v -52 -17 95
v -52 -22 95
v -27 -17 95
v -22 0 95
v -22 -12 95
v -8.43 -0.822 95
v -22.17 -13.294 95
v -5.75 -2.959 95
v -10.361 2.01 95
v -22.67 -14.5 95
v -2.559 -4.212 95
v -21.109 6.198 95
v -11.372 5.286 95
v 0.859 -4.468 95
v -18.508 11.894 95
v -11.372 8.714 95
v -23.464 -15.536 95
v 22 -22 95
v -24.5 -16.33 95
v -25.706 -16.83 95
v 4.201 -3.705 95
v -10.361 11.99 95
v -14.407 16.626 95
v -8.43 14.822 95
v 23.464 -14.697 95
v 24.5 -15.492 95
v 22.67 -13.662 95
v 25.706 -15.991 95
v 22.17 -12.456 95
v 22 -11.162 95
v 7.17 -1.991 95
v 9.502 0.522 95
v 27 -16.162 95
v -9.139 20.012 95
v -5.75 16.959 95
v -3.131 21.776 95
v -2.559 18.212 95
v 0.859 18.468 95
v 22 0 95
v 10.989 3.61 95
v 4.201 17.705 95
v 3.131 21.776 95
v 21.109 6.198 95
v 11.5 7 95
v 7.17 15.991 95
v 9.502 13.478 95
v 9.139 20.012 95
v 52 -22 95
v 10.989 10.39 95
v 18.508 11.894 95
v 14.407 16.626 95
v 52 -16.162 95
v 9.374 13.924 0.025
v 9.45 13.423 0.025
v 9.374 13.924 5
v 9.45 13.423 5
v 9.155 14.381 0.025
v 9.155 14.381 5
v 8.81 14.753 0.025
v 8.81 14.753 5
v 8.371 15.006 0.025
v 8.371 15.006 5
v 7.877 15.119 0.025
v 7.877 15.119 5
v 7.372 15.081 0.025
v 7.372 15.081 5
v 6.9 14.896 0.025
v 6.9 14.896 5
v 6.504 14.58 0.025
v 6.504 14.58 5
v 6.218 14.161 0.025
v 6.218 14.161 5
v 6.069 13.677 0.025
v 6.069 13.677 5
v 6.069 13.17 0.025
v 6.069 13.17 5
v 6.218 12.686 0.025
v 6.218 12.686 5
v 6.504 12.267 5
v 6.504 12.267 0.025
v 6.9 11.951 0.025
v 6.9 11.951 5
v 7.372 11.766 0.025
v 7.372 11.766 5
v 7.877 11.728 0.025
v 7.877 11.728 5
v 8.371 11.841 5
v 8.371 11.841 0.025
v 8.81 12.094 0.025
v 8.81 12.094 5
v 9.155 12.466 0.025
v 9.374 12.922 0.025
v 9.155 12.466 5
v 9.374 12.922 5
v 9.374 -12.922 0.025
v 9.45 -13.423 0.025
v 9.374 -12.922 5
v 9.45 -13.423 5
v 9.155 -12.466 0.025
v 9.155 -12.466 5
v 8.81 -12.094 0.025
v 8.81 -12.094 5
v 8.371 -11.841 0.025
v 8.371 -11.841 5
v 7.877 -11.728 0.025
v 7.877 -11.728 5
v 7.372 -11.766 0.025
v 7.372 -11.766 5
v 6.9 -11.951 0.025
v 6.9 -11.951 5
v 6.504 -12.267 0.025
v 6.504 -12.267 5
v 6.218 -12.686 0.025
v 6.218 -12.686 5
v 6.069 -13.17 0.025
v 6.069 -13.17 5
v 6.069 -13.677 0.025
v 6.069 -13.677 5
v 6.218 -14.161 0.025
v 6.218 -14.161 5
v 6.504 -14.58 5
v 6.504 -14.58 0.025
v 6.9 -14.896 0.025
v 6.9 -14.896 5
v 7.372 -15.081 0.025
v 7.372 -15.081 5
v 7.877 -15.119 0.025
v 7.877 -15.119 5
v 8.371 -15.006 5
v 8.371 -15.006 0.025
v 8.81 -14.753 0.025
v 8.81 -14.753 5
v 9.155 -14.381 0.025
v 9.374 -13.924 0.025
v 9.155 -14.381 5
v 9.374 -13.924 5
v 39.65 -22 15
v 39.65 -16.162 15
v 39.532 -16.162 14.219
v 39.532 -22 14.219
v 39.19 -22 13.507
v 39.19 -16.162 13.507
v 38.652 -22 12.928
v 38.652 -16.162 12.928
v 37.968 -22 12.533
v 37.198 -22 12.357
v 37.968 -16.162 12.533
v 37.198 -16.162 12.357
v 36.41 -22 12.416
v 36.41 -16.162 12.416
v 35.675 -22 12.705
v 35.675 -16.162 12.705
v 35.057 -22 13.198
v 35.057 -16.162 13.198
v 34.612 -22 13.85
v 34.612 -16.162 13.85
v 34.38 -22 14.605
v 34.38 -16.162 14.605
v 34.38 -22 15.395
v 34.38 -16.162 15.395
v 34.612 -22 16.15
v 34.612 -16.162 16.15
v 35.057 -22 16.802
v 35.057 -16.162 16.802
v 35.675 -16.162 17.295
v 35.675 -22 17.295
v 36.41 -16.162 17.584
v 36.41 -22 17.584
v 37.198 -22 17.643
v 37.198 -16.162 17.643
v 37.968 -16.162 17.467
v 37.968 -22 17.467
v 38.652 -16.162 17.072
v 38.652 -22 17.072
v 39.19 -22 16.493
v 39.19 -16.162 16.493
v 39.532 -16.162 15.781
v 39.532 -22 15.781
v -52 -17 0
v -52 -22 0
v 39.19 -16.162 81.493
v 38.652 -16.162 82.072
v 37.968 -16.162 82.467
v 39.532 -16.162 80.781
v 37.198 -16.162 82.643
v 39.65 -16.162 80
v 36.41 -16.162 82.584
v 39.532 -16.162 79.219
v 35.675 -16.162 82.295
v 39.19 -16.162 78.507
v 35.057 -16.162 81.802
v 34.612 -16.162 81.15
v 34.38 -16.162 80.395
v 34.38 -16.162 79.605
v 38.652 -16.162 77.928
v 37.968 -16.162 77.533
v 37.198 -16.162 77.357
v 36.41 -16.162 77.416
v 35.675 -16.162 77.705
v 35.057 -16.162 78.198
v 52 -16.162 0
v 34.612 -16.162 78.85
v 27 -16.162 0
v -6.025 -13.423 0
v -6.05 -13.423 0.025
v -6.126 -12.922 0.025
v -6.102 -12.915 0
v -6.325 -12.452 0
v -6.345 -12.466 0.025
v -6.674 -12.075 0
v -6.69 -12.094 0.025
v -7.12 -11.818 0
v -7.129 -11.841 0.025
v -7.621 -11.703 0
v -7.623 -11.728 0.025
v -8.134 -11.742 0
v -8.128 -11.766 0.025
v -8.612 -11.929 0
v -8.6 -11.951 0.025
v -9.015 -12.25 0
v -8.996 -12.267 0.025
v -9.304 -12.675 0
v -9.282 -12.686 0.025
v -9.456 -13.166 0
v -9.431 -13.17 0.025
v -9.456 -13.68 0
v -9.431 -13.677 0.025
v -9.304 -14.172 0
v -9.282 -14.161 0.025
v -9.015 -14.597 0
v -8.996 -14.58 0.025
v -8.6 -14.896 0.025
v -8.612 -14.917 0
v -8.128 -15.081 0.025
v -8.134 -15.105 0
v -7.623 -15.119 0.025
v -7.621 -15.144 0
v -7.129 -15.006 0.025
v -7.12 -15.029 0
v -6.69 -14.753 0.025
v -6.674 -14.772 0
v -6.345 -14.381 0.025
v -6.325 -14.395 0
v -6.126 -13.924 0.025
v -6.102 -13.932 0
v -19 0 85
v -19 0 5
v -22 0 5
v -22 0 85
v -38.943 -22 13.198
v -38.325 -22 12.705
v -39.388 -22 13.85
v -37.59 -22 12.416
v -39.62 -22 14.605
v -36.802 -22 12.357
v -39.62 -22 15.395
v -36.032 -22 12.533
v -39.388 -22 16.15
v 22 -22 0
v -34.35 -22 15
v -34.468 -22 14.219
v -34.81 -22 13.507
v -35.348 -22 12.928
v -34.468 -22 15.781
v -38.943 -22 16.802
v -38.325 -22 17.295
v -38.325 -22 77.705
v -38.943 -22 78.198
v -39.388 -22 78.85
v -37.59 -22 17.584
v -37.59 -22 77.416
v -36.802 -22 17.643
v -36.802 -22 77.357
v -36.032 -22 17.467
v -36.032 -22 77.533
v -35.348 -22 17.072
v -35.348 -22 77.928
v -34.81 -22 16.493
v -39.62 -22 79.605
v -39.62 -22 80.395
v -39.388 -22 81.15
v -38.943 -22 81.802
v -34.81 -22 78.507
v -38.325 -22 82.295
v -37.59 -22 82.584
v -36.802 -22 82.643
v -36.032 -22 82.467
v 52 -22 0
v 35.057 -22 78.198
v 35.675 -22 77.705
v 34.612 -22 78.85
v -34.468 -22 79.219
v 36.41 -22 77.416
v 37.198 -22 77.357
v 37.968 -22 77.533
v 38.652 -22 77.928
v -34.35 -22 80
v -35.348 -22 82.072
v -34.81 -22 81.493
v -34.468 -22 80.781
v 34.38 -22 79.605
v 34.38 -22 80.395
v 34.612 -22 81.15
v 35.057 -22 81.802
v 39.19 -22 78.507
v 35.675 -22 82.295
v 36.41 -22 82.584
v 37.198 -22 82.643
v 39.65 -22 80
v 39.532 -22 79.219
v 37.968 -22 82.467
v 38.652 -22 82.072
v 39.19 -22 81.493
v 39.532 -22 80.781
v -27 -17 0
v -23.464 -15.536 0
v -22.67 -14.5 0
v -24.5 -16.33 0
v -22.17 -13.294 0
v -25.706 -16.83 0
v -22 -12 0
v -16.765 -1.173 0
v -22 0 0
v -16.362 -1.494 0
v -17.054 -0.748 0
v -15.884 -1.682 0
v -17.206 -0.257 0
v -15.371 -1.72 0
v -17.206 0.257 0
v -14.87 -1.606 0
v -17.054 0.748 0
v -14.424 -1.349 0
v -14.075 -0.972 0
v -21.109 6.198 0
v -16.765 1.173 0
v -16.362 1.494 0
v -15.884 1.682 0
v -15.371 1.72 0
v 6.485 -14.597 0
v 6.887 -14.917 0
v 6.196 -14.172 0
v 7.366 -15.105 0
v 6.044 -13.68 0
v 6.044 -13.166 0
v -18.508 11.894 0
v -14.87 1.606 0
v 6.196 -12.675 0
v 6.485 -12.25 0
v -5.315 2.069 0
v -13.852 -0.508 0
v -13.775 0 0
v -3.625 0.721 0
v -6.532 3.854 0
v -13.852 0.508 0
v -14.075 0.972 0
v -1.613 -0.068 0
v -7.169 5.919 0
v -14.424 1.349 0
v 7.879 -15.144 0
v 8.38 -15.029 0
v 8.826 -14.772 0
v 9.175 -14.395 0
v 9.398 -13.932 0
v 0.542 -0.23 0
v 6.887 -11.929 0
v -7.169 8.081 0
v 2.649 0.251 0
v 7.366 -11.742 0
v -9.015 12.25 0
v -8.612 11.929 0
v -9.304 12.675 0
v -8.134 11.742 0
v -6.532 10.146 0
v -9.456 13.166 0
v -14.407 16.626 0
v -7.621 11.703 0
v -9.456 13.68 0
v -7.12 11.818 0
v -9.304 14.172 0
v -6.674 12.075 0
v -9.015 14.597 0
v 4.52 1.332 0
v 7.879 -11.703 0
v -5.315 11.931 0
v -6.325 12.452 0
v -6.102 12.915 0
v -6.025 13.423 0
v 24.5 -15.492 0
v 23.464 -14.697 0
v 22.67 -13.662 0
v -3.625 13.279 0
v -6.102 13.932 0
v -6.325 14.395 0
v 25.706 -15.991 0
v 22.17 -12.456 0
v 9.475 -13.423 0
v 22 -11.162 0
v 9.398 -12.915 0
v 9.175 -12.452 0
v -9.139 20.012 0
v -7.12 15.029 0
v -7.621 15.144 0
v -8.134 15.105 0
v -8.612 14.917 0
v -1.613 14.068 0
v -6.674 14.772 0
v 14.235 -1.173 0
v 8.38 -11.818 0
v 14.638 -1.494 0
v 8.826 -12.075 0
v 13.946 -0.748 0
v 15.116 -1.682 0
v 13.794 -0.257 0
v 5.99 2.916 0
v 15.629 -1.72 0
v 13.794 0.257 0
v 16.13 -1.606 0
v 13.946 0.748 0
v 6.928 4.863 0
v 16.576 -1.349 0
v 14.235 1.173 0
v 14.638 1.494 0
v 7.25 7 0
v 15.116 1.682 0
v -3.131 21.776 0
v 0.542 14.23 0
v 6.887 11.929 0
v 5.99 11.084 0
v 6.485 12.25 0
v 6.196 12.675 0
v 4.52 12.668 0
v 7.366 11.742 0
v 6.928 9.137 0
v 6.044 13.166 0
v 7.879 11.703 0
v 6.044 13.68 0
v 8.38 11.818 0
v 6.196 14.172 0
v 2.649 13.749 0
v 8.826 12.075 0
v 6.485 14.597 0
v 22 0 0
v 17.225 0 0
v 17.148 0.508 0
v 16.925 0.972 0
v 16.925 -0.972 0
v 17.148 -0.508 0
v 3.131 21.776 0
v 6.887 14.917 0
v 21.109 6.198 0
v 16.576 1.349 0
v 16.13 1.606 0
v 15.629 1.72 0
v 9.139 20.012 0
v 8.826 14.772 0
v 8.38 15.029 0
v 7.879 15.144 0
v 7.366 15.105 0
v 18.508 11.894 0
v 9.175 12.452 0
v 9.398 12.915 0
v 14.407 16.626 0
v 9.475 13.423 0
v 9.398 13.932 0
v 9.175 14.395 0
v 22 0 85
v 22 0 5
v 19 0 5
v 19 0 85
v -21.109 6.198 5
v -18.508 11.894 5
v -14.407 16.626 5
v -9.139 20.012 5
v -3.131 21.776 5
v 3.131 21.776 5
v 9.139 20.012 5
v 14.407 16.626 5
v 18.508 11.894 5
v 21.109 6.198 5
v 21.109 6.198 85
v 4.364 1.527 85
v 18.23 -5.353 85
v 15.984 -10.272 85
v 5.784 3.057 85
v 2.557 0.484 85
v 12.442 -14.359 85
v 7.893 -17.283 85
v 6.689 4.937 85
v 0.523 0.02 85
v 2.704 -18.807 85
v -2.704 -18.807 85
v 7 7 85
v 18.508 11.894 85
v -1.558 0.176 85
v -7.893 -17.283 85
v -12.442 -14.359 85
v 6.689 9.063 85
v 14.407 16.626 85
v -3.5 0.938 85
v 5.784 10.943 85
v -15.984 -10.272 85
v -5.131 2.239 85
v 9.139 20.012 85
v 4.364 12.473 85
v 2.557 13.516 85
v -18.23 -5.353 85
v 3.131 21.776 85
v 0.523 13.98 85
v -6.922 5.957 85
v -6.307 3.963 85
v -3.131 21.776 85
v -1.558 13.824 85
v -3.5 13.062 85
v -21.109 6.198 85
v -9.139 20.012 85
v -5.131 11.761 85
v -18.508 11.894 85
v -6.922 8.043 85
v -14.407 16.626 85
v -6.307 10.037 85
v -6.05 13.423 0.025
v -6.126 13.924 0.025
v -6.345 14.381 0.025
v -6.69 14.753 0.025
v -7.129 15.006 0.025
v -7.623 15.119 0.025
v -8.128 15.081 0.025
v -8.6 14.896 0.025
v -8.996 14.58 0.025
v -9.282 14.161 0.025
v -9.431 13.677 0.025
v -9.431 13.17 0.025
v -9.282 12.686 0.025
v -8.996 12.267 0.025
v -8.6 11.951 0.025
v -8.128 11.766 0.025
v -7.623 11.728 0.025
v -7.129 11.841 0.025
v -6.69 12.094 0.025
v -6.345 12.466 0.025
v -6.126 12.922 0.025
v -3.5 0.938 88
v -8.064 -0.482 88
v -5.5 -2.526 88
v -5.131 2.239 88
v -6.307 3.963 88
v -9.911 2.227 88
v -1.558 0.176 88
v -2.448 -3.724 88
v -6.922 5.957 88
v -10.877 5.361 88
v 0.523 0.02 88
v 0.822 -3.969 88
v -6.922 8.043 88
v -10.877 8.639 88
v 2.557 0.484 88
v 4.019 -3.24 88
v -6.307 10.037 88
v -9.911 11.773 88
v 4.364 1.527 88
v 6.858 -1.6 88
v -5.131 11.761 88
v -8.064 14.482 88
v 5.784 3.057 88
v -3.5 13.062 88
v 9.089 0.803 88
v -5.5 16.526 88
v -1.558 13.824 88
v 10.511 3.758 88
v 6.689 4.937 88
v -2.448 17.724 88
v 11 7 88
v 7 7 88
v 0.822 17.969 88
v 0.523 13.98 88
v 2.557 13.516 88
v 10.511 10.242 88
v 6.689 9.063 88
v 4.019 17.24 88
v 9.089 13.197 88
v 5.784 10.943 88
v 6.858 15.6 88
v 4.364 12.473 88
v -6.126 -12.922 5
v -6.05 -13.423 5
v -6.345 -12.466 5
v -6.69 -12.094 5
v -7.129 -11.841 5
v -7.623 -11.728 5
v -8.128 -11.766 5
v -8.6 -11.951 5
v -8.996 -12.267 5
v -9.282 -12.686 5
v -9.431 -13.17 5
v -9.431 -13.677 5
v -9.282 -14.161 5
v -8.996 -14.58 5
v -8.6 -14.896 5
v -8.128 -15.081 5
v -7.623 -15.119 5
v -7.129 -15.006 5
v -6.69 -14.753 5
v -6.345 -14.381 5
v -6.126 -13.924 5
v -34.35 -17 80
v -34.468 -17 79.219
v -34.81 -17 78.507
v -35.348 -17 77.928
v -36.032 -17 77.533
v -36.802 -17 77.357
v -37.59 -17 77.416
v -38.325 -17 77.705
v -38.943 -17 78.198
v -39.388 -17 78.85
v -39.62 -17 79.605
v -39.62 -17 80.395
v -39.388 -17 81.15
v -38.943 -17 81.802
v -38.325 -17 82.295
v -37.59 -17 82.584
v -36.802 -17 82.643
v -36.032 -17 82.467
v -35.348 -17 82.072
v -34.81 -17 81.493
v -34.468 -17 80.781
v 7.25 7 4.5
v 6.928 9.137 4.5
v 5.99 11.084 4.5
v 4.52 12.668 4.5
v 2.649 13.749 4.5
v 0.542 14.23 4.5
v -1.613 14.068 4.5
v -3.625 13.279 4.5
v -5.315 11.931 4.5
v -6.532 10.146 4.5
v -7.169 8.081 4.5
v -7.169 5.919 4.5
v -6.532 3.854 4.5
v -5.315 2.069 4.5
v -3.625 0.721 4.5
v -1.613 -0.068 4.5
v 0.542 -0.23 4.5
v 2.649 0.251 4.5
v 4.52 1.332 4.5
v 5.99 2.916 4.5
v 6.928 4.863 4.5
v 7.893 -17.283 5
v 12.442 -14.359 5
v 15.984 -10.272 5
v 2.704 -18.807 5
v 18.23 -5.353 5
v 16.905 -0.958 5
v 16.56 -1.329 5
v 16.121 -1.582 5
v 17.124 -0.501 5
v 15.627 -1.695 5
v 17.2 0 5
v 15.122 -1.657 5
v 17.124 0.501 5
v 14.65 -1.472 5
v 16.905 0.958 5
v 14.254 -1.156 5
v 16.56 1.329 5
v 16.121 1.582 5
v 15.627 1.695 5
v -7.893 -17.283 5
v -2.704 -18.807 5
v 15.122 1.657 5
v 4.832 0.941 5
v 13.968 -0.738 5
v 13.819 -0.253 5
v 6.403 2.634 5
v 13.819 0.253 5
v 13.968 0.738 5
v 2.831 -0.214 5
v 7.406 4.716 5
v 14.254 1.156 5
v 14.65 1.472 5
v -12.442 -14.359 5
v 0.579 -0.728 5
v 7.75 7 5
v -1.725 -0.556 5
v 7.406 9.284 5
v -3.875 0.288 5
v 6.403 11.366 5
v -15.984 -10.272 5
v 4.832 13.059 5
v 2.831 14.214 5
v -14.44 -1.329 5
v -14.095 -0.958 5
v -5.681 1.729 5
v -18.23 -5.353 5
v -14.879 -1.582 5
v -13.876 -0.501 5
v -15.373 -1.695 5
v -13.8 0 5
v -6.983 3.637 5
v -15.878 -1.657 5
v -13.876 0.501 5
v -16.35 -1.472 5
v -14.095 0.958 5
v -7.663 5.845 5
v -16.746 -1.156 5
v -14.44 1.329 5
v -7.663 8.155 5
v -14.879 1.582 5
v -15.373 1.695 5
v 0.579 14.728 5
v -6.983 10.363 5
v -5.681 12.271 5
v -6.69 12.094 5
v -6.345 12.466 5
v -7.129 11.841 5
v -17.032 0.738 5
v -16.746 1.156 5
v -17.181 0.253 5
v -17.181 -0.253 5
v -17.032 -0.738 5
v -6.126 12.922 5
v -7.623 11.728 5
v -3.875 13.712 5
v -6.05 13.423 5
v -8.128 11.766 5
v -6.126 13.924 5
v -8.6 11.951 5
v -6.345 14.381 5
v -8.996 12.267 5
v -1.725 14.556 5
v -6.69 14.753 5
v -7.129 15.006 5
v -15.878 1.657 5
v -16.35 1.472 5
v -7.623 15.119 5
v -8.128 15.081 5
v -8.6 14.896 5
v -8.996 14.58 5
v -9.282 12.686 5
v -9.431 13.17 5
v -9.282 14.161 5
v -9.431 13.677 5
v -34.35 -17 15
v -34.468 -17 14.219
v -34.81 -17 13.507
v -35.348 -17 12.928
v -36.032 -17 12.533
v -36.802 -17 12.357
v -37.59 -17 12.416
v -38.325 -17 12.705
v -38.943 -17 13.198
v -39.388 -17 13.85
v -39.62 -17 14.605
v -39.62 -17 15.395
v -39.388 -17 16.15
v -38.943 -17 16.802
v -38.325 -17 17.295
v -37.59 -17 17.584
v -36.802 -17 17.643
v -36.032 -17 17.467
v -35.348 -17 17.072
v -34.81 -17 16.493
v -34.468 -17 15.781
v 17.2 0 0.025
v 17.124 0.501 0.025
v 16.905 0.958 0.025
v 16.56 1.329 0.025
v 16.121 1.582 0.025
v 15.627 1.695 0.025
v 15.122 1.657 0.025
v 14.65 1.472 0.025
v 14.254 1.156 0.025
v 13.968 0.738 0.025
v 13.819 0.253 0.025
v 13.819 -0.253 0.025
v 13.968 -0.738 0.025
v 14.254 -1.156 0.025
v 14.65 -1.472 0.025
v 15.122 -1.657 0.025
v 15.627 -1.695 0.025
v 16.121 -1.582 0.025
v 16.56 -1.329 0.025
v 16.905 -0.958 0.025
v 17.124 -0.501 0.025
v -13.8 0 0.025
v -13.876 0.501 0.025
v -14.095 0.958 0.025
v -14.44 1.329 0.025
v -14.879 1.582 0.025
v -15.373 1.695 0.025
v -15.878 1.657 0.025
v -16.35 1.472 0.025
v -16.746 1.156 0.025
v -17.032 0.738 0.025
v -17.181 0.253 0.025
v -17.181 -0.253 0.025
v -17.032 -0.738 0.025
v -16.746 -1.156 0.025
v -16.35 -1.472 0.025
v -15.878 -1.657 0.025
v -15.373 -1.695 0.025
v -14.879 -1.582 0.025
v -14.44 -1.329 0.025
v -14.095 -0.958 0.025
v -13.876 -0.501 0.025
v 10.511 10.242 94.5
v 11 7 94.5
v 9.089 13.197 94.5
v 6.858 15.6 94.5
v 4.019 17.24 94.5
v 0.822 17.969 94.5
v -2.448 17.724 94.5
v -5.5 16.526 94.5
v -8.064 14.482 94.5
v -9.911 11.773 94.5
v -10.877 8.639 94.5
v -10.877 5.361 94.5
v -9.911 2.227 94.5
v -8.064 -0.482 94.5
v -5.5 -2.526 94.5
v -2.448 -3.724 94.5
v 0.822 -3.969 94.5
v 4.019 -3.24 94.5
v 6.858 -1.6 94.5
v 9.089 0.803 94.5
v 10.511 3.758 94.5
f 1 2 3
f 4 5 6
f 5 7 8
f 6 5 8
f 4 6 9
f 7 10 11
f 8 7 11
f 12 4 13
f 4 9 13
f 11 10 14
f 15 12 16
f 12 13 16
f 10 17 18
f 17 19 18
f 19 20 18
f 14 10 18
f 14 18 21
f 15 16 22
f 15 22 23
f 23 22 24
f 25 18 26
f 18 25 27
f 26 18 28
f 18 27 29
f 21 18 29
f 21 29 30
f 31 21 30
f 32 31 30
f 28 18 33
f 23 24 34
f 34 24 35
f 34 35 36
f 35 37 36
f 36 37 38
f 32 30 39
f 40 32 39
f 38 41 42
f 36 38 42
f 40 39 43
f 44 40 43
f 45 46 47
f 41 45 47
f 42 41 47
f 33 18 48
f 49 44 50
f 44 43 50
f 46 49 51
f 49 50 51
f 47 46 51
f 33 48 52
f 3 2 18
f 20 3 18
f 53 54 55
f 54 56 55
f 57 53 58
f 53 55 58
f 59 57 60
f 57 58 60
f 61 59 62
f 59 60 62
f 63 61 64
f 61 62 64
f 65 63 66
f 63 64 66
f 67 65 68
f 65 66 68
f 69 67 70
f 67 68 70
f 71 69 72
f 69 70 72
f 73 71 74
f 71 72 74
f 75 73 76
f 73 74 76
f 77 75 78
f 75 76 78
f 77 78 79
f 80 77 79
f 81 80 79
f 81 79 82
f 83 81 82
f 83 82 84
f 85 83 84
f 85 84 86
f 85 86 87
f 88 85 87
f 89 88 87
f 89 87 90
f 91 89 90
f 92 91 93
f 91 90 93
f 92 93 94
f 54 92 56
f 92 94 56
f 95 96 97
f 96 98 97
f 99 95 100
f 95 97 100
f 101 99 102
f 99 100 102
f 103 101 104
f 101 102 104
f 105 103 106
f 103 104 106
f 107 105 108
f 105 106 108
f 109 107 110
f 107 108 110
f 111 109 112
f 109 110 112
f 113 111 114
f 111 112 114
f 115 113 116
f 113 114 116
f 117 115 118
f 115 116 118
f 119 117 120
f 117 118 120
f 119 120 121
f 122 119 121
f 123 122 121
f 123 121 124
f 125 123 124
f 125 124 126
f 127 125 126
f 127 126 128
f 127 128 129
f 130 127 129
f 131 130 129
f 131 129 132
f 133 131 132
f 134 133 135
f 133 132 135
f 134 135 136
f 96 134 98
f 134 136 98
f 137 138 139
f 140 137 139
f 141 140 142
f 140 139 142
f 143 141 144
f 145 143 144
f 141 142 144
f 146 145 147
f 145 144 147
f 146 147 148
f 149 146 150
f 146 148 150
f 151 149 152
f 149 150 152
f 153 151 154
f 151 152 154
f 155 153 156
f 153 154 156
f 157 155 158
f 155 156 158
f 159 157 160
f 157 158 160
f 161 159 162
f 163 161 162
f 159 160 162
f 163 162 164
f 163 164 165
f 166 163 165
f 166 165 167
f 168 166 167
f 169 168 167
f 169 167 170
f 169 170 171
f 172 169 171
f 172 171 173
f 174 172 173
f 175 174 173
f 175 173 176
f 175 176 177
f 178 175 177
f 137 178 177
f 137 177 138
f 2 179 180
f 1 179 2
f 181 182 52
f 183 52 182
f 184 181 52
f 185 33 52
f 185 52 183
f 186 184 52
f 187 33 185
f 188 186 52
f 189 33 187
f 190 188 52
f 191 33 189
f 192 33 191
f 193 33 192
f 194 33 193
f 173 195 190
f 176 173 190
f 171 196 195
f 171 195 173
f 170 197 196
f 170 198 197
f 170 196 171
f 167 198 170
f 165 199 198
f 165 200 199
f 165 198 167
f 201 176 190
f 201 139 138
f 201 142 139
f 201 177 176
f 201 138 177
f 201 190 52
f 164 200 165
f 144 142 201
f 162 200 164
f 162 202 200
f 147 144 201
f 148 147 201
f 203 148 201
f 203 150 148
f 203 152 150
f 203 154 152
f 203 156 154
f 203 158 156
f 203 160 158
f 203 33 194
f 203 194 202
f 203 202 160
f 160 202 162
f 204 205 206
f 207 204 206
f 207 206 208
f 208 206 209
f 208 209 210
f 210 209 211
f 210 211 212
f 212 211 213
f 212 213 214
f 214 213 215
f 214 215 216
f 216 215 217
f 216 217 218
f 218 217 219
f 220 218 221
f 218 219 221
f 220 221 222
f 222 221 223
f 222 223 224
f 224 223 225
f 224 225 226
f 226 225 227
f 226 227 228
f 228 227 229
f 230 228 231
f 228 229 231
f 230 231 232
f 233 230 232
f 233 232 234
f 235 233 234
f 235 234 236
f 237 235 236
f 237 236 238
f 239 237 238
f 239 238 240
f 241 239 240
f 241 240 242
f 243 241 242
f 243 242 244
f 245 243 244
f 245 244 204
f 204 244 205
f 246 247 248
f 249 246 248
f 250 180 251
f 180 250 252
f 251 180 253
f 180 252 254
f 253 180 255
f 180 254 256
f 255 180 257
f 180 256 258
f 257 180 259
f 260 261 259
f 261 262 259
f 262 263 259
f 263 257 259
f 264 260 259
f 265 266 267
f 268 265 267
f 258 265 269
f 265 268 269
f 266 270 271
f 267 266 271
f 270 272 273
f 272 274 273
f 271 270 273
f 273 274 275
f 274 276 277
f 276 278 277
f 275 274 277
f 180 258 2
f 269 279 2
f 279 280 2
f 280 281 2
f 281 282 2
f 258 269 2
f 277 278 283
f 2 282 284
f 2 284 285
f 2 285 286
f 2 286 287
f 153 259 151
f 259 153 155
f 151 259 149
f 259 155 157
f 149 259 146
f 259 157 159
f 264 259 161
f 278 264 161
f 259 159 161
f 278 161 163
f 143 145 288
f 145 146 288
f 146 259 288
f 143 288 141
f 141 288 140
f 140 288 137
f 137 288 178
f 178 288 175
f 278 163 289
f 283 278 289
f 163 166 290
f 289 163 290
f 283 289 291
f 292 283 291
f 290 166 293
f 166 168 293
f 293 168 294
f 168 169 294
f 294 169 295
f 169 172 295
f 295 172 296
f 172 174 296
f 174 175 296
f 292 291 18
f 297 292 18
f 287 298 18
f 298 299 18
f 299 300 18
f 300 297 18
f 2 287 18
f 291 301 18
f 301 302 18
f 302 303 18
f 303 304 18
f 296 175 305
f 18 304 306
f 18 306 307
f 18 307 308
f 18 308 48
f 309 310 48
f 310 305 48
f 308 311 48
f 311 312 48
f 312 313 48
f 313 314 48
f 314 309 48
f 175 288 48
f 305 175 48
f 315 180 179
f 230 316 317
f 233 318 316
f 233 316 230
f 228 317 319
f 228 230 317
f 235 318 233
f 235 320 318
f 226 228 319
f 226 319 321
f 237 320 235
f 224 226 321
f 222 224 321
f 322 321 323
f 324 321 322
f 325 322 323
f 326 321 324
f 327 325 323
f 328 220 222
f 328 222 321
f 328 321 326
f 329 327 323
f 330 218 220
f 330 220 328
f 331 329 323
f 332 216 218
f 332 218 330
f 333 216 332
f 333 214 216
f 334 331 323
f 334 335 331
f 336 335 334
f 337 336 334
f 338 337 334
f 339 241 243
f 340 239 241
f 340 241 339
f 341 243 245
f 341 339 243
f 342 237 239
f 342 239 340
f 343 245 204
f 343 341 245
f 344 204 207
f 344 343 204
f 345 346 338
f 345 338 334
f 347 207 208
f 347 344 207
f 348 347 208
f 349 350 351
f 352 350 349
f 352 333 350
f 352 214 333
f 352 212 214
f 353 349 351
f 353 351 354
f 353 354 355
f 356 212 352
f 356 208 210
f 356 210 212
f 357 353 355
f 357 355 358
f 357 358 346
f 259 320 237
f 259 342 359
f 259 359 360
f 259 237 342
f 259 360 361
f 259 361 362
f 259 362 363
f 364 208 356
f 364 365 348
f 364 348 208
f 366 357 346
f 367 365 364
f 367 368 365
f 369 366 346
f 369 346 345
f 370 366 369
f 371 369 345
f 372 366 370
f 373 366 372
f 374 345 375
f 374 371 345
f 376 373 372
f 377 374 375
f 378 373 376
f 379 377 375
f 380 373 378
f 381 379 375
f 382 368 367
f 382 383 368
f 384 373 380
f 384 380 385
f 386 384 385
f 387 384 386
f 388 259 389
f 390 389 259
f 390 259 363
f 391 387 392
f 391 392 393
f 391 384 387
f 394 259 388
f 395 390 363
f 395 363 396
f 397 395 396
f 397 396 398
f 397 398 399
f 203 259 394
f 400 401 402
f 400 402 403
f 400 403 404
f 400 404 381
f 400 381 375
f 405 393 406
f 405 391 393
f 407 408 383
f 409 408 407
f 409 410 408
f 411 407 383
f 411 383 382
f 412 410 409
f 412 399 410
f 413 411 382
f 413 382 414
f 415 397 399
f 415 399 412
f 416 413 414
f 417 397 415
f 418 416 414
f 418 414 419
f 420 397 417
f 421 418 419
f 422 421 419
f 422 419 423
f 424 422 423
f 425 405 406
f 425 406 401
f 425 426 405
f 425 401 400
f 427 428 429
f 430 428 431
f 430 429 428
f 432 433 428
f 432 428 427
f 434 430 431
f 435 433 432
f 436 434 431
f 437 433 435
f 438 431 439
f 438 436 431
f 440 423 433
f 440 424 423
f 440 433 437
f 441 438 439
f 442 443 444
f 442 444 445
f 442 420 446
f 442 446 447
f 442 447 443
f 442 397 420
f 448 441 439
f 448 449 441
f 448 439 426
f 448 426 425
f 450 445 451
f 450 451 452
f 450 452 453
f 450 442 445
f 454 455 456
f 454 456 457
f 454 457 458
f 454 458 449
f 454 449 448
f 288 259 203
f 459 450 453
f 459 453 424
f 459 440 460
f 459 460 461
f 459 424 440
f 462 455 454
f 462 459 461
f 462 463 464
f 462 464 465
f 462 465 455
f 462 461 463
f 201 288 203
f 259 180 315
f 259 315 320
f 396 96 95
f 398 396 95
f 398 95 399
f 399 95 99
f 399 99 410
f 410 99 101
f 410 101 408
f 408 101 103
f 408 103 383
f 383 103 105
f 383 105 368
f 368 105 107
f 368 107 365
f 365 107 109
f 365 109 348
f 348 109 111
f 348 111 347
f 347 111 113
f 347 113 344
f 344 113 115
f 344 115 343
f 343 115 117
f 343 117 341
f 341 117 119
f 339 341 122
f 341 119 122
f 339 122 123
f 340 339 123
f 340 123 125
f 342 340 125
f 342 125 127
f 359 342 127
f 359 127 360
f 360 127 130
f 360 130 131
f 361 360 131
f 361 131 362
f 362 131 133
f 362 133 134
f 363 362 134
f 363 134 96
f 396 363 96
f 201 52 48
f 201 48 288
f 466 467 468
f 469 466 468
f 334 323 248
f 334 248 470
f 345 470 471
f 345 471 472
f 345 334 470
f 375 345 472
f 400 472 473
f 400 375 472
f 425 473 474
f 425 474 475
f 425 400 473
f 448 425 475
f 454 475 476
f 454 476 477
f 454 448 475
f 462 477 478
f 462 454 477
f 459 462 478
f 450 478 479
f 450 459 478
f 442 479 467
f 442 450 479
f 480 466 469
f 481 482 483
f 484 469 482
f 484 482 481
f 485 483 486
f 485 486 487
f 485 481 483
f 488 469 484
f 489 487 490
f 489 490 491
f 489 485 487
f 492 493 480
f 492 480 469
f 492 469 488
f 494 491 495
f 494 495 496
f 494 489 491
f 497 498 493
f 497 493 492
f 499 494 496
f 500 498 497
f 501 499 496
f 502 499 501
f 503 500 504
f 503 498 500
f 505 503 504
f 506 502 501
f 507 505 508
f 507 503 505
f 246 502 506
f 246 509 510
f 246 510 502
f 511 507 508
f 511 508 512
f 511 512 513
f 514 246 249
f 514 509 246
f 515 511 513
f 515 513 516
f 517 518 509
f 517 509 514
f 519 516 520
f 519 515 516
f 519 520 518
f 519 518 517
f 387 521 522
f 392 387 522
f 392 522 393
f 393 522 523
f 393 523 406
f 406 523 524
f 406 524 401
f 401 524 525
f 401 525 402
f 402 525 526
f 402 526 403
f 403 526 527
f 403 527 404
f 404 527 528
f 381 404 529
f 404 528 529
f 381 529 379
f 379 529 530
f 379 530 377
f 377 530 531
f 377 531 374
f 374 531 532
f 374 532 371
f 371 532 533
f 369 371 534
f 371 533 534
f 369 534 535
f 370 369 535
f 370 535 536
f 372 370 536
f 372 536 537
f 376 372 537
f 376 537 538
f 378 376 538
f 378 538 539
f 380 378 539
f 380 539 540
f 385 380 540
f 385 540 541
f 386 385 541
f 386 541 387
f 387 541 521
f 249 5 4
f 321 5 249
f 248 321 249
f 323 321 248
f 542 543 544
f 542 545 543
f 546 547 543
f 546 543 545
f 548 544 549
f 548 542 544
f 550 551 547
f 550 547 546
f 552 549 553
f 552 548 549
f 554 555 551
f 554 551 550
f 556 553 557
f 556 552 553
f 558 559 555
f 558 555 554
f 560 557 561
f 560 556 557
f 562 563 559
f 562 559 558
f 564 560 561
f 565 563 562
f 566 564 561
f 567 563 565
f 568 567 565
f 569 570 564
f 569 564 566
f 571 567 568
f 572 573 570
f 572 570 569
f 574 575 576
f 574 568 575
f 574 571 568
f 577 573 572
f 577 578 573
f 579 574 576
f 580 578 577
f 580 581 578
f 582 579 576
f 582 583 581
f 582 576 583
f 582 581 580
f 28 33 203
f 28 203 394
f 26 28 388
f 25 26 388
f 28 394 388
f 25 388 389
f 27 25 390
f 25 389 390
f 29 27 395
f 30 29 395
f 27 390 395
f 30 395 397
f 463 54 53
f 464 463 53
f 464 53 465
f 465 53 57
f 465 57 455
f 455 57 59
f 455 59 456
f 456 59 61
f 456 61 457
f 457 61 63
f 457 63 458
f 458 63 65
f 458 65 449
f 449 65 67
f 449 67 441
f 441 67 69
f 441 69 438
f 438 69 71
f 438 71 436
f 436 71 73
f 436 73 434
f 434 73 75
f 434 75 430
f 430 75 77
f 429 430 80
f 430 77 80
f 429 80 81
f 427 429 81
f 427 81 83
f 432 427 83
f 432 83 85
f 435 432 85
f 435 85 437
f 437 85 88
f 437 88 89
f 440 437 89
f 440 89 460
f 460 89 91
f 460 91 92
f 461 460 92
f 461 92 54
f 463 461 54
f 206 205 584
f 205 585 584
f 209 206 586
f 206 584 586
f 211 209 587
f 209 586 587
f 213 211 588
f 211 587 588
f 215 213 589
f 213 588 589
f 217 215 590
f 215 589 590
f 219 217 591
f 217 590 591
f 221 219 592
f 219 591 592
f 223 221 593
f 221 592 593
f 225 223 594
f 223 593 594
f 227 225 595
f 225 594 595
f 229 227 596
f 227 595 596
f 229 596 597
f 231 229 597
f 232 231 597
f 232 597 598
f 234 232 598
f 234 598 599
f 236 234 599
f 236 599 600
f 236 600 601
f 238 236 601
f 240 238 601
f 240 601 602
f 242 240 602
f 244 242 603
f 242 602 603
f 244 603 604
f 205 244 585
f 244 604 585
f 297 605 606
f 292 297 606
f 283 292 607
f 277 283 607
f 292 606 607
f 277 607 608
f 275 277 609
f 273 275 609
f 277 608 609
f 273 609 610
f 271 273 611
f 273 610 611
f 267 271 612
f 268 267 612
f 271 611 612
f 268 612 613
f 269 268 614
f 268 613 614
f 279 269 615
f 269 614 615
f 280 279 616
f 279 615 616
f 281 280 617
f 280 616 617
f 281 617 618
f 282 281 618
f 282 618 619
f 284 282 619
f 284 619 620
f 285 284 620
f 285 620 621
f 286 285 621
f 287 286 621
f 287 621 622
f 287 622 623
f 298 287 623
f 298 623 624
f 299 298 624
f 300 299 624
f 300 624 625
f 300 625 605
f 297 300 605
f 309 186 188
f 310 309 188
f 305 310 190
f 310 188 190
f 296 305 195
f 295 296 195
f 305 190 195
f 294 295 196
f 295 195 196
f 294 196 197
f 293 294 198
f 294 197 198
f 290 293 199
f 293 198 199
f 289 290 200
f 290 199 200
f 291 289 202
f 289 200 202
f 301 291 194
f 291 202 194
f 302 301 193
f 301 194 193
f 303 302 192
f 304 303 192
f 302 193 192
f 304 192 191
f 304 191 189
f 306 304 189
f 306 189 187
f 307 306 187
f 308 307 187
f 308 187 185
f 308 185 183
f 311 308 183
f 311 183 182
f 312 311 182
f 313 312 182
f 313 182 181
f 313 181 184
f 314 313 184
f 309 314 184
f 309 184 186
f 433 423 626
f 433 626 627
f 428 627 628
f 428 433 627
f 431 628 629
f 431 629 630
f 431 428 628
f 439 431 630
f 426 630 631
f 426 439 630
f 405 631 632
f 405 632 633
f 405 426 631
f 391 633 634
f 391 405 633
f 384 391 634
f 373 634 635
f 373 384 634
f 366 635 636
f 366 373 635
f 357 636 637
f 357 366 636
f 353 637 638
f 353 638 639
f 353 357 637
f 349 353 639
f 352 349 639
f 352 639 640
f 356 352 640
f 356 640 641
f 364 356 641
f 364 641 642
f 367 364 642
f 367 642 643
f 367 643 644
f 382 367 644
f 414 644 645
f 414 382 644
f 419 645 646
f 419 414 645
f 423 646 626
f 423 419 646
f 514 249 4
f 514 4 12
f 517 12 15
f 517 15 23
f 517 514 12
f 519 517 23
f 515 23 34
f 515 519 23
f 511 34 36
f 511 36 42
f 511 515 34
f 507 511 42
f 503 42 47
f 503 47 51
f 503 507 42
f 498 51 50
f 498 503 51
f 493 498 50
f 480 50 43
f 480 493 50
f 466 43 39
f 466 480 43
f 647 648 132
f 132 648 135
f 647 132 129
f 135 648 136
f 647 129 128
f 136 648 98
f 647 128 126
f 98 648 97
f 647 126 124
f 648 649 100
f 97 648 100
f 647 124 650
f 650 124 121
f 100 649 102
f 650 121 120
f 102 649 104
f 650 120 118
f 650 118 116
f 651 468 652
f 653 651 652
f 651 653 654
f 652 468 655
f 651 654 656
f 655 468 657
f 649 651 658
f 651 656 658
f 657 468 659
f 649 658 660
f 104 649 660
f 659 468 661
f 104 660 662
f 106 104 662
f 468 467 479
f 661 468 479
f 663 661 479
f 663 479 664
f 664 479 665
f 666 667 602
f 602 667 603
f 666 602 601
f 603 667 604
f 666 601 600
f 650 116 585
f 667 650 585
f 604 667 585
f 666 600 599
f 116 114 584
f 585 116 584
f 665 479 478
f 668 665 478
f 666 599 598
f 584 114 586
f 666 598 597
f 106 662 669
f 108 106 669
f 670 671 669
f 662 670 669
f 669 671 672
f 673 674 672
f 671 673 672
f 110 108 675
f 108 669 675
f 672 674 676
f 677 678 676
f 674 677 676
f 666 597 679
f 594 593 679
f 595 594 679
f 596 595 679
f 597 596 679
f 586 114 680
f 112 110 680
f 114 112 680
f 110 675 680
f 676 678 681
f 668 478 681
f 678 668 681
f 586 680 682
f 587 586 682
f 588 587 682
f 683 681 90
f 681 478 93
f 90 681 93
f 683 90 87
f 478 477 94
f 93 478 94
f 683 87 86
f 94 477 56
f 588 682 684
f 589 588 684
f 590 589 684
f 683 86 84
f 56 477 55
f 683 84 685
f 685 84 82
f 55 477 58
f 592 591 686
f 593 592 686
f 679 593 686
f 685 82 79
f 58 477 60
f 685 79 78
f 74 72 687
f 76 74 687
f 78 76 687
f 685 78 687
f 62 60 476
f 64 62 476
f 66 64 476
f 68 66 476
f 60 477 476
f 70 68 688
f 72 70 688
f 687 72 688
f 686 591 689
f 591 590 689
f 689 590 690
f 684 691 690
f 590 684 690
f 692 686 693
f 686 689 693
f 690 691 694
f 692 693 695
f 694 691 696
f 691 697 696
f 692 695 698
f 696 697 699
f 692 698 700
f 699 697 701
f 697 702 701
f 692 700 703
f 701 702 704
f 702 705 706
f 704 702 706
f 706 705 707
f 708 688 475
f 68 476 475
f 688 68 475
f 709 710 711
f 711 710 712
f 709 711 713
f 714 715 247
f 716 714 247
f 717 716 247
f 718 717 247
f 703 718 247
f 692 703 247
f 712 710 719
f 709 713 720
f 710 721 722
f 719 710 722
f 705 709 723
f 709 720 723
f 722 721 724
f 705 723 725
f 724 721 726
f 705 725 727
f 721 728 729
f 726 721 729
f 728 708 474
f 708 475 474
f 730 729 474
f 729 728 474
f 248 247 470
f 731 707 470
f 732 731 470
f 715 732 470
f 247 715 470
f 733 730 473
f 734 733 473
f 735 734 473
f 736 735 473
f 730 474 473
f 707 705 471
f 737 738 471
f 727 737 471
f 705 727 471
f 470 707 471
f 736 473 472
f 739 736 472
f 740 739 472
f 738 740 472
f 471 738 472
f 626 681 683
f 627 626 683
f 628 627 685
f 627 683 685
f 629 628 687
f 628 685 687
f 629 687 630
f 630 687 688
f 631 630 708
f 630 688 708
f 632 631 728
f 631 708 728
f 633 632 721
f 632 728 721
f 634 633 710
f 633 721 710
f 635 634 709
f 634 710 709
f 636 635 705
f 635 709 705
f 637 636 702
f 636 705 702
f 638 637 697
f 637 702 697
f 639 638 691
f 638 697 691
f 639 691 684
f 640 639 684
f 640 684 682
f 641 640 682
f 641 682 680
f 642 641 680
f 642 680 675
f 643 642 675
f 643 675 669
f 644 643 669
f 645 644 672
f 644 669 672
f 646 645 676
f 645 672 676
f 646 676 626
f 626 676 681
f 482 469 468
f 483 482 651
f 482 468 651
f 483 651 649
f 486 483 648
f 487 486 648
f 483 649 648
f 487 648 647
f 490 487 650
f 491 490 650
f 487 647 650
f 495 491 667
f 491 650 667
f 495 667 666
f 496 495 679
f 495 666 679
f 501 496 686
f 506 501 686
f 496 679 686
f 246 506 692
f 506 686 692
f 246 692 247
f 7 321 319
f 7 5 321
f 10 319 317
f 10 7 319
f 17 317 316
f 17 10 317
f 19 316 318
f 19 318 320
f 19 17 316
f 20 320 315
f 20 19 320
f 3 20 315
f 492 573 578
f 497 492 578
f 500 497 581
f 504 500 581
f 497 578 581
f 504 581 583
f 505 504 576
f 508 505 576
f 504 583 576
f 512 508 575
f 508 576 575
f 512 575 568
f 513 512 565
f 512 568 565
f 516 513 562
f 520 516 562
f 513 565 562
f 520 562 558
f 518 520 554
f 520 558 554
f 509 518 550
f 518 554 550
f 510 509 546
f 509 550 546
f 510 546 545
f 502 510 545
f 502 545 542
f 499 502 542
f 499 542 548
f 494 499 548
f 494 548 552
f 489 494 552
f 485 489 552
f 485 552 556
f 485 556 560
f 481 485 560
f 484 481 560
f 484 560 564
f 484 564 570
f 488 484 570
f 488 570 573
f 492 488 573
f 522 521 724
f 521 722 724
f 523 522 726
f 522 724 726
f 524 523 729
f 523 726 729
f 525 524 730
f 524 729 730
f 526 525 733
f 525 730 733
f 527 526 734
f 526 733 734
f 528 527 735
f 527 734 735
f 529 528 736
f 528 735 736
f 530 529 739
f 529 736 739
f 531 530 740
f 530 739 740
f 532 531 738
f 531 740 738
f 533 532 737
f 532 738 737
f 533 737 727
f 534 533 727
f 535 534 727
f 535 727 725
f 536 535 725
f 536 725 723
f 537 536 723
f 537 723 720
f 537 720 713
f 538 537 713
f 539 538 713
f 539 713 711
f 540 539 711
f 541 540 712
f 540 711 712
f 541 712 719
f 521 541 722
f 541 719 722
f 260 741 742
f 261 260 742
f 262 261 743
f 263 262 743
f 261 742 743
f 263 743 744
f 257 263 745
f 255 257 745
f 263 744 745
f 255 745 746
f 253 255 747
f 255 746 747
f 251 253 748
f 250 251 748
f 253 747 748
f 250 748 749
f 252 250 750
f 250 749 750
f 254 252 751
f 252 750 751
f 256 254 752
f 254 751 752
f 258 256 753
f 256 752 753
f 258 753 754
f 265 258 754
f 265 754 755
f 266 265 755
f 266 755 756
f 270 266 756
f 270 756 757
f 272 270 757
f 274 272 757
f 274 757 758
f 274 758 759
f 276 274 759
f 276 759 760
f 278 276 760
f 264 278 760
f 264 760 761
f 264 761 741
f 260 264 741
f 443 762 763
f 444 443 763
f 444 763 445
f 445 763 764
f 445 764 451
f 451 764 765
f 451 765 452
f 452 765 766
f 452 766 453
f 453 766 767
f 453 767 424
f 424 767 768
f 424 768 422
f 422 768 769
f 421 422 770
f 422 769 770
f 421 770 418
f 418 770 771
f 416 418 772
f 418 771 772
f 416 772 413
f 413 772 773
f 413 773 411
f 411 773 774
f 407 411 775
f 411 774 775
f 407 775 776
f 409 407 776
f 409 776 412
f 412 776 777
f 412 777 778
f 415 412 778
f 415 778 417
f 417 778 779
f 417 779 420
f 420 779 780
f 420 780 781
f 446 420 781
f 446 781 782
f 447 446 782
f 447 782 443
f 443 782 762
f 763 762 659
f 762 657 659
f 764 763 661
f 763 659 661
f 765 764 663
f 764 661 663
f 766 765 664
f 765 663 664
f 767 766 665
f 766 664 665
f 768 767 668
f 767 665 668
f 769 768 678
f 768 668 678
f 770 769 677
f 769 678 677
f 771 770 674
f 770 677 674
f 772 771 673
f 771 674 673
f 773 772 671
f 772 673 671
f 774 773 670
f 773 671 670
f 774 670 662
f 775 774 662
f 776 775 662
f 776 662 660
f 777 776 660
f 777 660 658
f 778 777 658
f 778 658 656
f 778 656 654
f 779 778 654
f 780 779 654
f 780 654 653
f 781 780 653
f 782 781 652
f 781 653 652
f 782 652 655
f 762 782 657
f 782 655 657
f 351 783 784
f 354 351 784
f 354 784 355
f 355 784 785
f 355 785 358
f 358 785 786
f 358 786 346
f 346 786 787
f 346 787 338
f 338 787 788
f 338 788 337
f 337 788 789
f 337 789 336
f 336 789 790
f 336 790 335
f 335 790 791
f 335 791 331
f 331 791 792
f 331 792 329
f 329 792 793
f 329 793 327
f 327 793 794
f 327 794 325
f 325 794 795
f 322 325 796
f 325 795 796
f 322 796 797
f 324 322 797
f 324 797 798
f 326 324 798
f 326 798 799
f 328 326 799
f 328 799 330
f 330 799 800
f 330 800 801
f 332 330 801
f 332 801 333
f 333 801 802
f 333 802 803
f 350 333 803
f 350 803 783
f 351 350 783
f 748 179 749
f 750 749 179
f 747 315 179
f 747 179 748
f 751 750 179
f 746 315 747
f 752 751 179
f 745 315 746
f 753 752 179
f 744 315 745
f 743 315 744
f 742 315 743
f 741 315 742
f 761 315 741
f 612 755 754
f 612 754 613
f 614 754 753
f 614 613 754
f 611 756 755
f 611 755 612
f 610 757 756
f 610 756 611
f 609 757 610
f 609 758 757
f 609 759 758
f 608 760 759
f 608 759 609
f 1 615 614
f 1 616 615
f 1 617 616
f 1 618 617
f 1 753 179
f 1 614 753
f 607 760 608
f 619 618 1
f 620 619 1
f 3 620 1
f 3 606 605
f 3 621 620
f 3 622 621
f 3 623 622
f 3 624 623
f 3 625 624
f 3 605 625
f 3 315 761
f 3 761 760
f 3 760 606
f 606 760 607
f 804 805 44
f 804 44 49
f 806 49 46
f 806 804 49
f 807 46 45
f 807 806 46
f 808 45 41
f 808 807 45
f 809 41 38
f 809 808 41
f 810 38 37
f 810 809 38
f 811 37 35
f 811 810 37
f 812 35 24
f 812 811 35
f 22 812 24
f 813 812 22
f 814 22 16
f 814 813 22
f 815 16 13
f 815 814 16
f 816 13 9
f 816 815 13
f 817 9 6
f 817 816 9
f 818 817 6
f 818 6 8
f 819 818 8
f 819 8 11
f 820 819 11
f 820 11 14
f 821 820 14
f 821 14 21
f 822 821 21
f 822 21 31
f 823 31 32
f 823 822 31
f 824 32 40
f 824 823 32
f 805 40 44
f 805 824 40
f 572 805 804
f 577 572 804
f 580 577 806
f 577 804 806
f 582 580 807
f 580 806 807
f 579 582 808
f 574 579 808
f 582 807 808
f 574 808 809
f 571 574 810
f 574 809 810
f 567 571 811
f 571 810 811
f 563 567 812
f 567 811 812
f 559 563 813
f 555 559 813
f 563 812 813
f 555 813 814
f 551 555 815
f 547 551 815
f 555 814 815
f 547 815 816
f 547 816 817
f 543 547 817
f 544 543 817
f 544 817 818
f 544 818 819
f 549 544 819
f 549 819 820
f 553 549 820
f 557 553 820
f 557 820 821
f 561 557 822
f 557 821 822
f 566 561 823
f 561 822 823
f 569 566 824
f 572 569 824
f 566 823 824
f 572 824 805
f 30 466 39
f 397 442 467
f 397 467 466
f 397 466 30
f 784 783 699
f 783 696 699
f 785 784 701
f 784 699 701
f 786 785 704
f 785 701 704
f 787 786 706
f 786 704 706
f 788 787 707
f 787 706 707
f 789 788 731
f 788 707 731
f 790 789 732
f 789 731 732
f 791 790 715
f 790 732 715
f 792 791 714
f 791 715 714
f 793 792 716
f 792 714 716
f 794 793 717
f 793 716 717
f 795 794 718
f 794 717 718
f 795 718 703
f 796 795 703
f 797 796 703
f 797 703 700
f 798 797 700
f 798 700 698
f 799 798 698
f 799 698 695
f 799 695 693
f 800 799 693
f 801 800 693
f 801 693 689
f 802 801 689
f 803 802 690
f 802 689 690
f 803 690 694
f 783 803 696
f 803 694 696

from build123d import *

# Parameters (mm, degrees)
SKETCH3_R                      = 7.25
BOSS_EXTRUDE1_DEPTH            = 5
M3_CLEARANCE_HOLE1_D           = 3.4
M3_CLEARANCE_HOLE1_CSINK_D     = 3.45
M3_CLEARANCE_HOLE1_CSINK_ANGLE = 90
BOSS_EXTRUDE2_DEPTH            = 80
BOSS_EXTRUDE3_DEPTH            = 10
SKETCH16_R                     = 11
CUT_EXTRUDE1_DEPTH             = 7
CUT_EXTRUDE2_REACH             = 90
SKETCH17_R                     = 7
CHAMFER2_SIZE                  = 0.5
CHAMFER3_SIZE                  = 0.5
SKETCH18_W                     = 95
SKETCH18_H                     = 5.838314525
BOSS_EXTRUDE5_DEPTH            = 30
SKETCH21_W                     = 95
SKETCH21_H                     = 5
BOSS_EXTRUDE6_DEPTH            = 30
FILLET1_R                      = 5
M5_CLEARANCE_SLOT1_D           = 5.3


with BuildPart() as part:
    # Sketch3 → Boss-Extrude1 (new body)
    with BuildSketch(Plane.XY):
        with BuildLine():
            Line((22, 0), (22, -22))
            Line((22, -22), (-22, -22))
            Line((-22, -22), (-22, 0))
            ThreePointArc((-22, 0), (0, 22), (22, 0))
        make_face()
        with Locations((0, 7)):
            Circle(SKETCH3_R, mode=Mode.SUBTRACT)
    extrude(amount=BOSS_EXTRUDE1_DEPTH)

    # M3 Clearance Hole1 (through all)
    with Locations(Plane(origin=(0, 0, 0), x_dir=(-1, 0, 0), z_dir=(0, 0, -1))):
        with Locations((-15.5, 0), (15.5, 0), (7.75, 13.423393759), (-7.75, 13.423393759), (-7.75, -13.423393759), (7.75, -13.423393759)):
            CounterSinkHole(M3_CLEARANCE_HOLE1_D / 2, M3_CLEARANCE_HOLE1_CSINK_D / 2, counter_sink_angle=M3_CLEARANCE_HOLE1_CSINK_ANGLE)

    # Sketch7 → Boss-Extrude2 (add)
    with BuildSketch(Plane.XY.offset(5)):
        with BuildLine():
            Line((-19, 0), (-22, 0))
            Line((-22, 0), (-22, -22))
            Line((-22, -22), (22, -22))
            Line((22, -22), (22, 0))
            Line((22, 0), (19, 0))
            ThreePointArc((19, 0), (0, -19), (-19, 0))
        make_face()
    extrude(amount=BOSS_EXTRUDE2_DEPTH)

    # Sketch9 → Boss-Extrude3 (add)
    with BuildSketch(Plane.XY.offset(85)):
        with BuildLine():
            Line((22, 0), (22, -22))
            Line((22, -22), (-22, -22))
            Line((-22, -22), (-22, 0))
            ThreePointArc((-22, 0), (0, 22), (22, 0))
        make_face()
    extrude(amount=BOSS_EXTRUDE3_DEPTH)

    # Sketch16 → Cut-Extrude1 (cut)
    with BuildSketch(Plane.XY.offset(95)):
        with Locations((0, 7)):
            Circle(SKETCH16_R)
    extrude(amount=-CUT_EXTRUDE1_DEPTH, mode=Mode.SUBTRACT)

    # Sketch17 → Cut-Extrude2 (cut, up to next)
    with BuildSketch(Plane.XY.offset(88), mode=Mode.PRIVATE) as cut_extrude2_sk1:
        with Locations((0, 7)):
            Circle(SKETCH17_R)
    cut_extrude2_tool1 = extrude(cut_extrude2_sk1.sketch, amount=-CUT_EXTRUDE2_REACH, mode=Mode.PRIVATE) & part.part
    add(cut_extrude2_tool1.solids().sort_by_distance((0, 7, 88))[0], mode=Mode.SUBTRACT)

    # Chamfer2
    chamfer2_edges = [part.edges().sort_by_distance(p)[0] for p in [
        (-11, 7, 95),
    ]]
    chamfer(chamfer2_edges, length=CHAMFER2_SIZE)

    # Chamfer3
    chamfer3_edges = [part.edges().sort_by_distance(p)[0] for p in [
        (-7.25, 7, 5),
    ]]
    chamfer(chamfer3_edges, length=CHAMFER3_SIZE)

    # Sketch18 → Boss-Extrude5 (add)
    with BuildSketch(Plane(origin=(22, 0, 0), x_dir=(0, 0, -1), z_dir=(1, 0, 0))):
        with Locations((-47.5, -19.080842737)):
            Rectangle(SKETCH18_W, SKETCH18_H)
    extrude(amount=BOSS_EXTRUDE5_DEPTH)

    # Sketch21 → Boss-Extrude6 (add)
    with BuildSketch(Plane.ZY.offset(22)):
        with Locations((47.5, -19.5)):
            Rectangle(SKETCH21_W, SKETCH21_H)
    extrude(amount=BOSS_EXTRUDE6_DEPTH)

    # Fillet1
    fillet1_edges = [part.edges().sort_by_distance(p)[0] for p in [
        (22, -16.161685475, 47.5),
        (-22, -17, 47.5),
    ]]
    fillet(fillet1_edges, radius=FILLET1_R)

    # M5 Clearance Slot1 (through all)
    with Locations(Plane(origin=(0, -22, 0), x_dir=(-1, 0, 0), z_dir=(0, -1, 0))):
        with Locations((37, -80), (-37, -80), (-37, -15), (37, -15)):
            Hole(M5_CLEARANCE_SLOT1_D / 2)


solid = part.part
